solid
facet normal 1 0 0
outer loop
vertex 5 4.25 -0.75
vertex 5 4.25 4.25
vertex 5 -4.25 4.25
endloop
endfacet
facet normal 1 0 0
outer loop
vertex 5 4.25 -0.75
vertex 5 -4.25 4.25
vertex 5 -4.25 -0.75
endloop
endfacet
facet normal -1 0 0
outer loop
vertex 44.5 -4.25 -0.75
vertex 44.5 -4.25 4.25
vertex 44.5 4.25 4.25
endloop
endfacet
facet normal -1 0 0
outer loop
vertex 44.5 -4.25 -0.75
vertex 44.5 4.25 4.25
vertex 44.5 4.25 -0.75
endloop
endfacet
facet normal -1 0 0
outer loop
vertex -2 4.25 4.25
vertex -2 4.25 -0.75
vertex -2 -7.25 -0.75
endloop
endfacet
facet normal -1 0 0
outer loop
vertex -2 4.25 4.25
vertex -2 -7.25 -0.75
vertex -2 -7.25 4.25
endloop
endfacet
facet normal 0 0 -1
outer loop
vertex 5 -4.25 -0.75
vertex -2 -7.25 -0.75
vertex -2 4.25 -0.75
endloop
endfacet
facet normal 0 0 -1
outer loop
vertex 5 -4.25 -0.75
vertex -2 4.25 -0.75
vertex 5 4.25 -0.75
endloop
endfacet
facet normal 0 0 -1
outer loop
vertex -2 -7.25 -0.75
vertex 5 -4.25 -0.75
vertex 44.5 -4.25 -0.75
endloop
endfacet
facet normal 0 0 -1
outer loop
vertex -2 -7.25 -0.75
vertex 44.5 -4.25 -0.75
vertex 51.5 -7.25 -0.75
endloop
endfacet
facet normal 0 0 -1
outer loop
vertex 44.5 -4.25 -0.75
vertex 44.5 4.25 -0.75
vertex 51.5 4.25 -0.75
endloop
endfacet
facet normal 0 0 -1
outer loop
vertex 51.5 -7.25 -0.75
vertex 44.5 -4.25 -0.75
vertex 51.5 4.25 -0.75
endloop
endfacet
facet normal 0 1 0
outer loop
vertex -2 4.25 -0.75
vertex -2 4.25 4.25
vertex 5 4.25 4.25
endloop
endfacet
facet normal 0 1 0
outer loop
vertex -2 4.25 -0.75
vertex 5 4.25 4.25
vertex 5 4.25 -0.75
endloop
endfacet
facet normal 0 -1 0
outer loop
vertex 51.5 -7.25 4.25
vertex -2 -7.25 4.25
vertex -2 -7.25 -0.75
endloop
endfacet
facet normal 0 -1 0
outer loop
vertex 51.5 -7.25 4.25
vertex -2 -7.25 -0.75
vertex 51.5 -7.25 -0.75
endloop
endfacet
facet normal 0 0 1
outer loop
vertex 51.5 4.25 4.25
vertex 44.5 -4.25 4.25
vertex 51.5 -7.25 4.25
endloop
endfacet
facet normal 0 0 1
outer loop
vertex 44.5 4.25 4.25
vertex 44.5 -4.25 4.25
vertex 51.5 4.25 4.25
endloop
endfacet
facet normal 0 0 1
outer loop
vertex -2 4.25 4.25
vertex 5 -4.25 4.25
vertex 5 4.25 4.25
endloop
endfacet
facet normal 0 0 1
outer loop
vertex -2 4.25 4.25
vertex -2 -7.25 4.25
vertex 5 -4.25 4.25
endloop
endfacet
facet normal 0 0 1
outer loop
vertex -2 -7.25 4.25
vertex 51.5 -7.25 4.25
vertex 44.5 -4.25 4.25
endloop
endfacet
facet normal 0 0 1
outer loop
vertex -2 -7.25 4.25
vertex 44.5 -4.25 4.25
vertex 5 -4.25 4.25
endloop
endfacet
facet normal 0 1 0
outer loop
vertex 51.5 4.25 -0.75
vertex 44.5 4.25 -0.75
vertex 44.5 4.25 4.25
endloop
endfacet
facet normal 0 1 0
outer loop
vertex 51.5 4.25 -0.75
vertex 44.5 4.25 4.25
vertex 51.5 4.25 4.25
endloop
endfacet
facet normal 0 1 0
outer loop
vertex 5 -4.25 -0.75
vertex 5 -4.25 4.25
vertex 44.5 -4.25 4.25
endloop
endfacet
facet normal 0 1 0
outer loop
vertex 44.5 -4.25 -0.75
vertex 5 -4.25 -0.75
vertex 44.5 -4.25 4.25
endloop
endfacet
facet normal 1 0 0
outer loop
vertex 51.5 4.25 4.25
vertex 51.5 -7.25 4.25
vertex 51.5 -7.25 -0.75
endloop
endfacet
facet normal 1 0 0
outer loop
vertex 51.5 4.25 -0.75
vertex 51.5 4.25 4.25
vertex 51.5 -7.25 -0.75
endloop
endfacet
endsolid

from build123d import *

# Parameters (mm, degrees)
SKETCH1_W           = 8.5
SKETCH1_H           = 8.5
BOSS_EXTRUDE1_DEPTH = 5
SKETCH2_W           = 8.5
SKETCH2_H           = 8.5
BOSS_EXTRUDE2_DEPTH = 2
SKETCH3_R           = 1.5
CUT_EXTRUDE1_DEPTH  = 2
SKETCH4_W           = 53.5
SKETCH4_H           = 8.5
BOSS_EXTRUDE3_DEPTH = 3
SKETCH5_W           = 7
SKETCH5_H           = 8.5
BOSS_EXTRUDE4_DEPTH = 8.5
SKETCH8_R           = 1.5
BOSS_EXTRUDE5_DEPTH = 2.5
SKETCH10_W          = 8.5
SKETCH10_H          = 8.5
BOSS_EXTRUDE7_DEPTH = 1
CUT_EXTRUDE4_DEPTH  = 0.5
SKETCH14_W          = 8.5
SKETCH14_H          = 8.5
BOSS_EXTRUDE8_DEPTH = 8
SKETCH15_W          = 8.5
SKETCH15_H          = 8.5
CUT_EXTRUDE6_DEPTH  = 1
SKETCH16_W          = 53.5
SKETCH16_H          = 3.5
CUT_EXTRUDE7_DEPTH  = 15
SKETCH17_W          = 5
SKETCH17_H          = 8.5
BOSS_EXTRUDE9_DEPTH = 7


with BuildPart() as part:
    # Sketch1 → Boss-Extrude1 (new body)
    with BuildSketch(Plane(origin=(0, 0, 0), x_dir=(0, 0, -1), z_dir=(1, 0, 0))):
        Rectangle(SKETCH1_W, SKETCH1_H)
        Polygon((1.705, 2.953146627), (-1.705, 2.953146627), (-3.41, 0), (-1.705, -2.953146627), (1.705, -2.953146627), (3.41, 0), align=None, mode=Mode.SUBTRACT)
    extrude(amount=BOSS_EXTRUDE1_DEPTH)

    # Sketch2 → Boss-Extrude2 (add)
    with BuildSketch(Plane.ZY):
        Rectangle(SKETCH2_W, SKETCH2_H)
    extrude(amount=BOSS_EXTRUDE2_DEPTH)

    # Sketch3 → Cut-Extrude1 (cut)
    with BuildSketch(Plane(origin=(0, 0, 0), x_dir=(0, 0, -1), z_dir=(1, 0, 0))):
        Circle(SKETCH3_R)
    extrude(amount=-CUT_EXTRUDE1_DEPTH, mode=Mode.SUBTRACT)

    # Sketch4 → Boss-Extrude3 (add)
    with BuildSketch(Plane.XZ.offset(4.25)):
        with Locations((24.75, 0)):
            Rectangle(SKETCH4_W, SKETCH4_H)
    extrude(amount=BOSS_EXTRUDE3_DEPTH)

    # Sketch5 → Boss-Extrude4 (add)
    with BuildSketch(Plane(origin=(0, -4.25, 0), x_dir=(1, 0, 0), z_dir=(0, 1, 0))):
        with Locations((48, 0)):
            Rectangle(SKETCH5_W, SKETCH5_H)
    extrude(amount=BOSS_EXTRUDE4_DEPTH)

    # Sketch8 → Boss-Extrude5 (add)
    with BuildSketch(Plane(origin=(0, 0, 0), x_dir=(0, 0, -1), z_dir=(1, 0, 0))):
        Polygon((-1.705, 2.953146627), (-3.41, 0), (-1.705, -2.953146627), (1.705, -2.953146627), (3.41, 0), (1.705, 2.953146627), align=None)
        Circle(SKETCH8_R, mode=Mode.SUBTRACT)
    extrude(amount=BOSS_EXTRUDE5_DEPTH)

    # Sketch10 → Boss-Extrude7 (add)
    with BuildSketch(Plane(origin=(5, 0, 0), x_dir=(0, 0, -1), z_dir=(1, 0, 0))):
        Rectangle(SKETCH10_W, SKETCH10_H)
        Polygon((3.41, 0), (1.705, 2.953146627), (-1.705, 2.953146627), (-3.41, 0), (-1.705, -2.953146627), (1.705, -2.953146627), align=None, mode=Mode.SUBTRACT)
    extrude(amount=BOSS_EXTRUDE7_DEPTH)

    # Sketch12 → Cut-Extrude4 (cut)
    with BuildSketch(Plane(origin=(2.5, 0, 0), x_dir=(0, 0, -1), z_dir=(1, 0, 0))):
        Polygon((1.705, -2.953146627), (3.41, 0), (1.705, 2.953146627), (-1.705, 2.953146627), (-3.41, 0), (-1.705, -2.953146627), align=None)
    extrude(amount=-CUT_EXTRUDE4_DEPTH, mode=Mode.SUBTRACT)

    # Sketch14 → Boss-Extrude8 (add)
    with BuildSketch(Plane(origin=(6, 0, 0), x_dir=(0, 0, -1), z_dir=(1, 0, 0))):
        Rectangle(SKETCH14_W, SKETCH14_H)
    extrude(amount=-BOSS_EXTRUDE8_DEPTH)

    # Sketch15 → Cut-Extrude6 (cut)
    with BuildSketch(Plane(origin=(6, 0, 0), x_dir=(0, 0, -1), z_dir=(1, 0, 0))):
        Rectangle(SKETCH15_W, SKETCH15_H)
    extrude(amount=-CUT_EXTRUDE6_DEPTH, mode=Mode.SUBTRACT)

    # Sketch16 → Cut-Extrude7 (cut)
    with BuildSketch(Plane(origin=(0, 4.25, 0), x_dir=(1, 0, 0), z_dir=(0, 1, 0))):
        with Locations((24.75, 2.5)):
            Rectangle(SKETCH16_W, SKETCH16_H)
    extrude(amount=-CUT_EXTRUDE7_DEPTH, mode=Mode.SUBTRACT)

    # Sketch17 → Boss-Extrude9 (add)
    with BuildSketch(Plane.ZY.offset(-44.5)):
        with Locations((1.75, 0)):
            Rectangle(SKETCH17_W, SKETCH17_H)
    extrude(amount=-BOSS_EXTRUDE9_DEPTH)


solid = part.part
